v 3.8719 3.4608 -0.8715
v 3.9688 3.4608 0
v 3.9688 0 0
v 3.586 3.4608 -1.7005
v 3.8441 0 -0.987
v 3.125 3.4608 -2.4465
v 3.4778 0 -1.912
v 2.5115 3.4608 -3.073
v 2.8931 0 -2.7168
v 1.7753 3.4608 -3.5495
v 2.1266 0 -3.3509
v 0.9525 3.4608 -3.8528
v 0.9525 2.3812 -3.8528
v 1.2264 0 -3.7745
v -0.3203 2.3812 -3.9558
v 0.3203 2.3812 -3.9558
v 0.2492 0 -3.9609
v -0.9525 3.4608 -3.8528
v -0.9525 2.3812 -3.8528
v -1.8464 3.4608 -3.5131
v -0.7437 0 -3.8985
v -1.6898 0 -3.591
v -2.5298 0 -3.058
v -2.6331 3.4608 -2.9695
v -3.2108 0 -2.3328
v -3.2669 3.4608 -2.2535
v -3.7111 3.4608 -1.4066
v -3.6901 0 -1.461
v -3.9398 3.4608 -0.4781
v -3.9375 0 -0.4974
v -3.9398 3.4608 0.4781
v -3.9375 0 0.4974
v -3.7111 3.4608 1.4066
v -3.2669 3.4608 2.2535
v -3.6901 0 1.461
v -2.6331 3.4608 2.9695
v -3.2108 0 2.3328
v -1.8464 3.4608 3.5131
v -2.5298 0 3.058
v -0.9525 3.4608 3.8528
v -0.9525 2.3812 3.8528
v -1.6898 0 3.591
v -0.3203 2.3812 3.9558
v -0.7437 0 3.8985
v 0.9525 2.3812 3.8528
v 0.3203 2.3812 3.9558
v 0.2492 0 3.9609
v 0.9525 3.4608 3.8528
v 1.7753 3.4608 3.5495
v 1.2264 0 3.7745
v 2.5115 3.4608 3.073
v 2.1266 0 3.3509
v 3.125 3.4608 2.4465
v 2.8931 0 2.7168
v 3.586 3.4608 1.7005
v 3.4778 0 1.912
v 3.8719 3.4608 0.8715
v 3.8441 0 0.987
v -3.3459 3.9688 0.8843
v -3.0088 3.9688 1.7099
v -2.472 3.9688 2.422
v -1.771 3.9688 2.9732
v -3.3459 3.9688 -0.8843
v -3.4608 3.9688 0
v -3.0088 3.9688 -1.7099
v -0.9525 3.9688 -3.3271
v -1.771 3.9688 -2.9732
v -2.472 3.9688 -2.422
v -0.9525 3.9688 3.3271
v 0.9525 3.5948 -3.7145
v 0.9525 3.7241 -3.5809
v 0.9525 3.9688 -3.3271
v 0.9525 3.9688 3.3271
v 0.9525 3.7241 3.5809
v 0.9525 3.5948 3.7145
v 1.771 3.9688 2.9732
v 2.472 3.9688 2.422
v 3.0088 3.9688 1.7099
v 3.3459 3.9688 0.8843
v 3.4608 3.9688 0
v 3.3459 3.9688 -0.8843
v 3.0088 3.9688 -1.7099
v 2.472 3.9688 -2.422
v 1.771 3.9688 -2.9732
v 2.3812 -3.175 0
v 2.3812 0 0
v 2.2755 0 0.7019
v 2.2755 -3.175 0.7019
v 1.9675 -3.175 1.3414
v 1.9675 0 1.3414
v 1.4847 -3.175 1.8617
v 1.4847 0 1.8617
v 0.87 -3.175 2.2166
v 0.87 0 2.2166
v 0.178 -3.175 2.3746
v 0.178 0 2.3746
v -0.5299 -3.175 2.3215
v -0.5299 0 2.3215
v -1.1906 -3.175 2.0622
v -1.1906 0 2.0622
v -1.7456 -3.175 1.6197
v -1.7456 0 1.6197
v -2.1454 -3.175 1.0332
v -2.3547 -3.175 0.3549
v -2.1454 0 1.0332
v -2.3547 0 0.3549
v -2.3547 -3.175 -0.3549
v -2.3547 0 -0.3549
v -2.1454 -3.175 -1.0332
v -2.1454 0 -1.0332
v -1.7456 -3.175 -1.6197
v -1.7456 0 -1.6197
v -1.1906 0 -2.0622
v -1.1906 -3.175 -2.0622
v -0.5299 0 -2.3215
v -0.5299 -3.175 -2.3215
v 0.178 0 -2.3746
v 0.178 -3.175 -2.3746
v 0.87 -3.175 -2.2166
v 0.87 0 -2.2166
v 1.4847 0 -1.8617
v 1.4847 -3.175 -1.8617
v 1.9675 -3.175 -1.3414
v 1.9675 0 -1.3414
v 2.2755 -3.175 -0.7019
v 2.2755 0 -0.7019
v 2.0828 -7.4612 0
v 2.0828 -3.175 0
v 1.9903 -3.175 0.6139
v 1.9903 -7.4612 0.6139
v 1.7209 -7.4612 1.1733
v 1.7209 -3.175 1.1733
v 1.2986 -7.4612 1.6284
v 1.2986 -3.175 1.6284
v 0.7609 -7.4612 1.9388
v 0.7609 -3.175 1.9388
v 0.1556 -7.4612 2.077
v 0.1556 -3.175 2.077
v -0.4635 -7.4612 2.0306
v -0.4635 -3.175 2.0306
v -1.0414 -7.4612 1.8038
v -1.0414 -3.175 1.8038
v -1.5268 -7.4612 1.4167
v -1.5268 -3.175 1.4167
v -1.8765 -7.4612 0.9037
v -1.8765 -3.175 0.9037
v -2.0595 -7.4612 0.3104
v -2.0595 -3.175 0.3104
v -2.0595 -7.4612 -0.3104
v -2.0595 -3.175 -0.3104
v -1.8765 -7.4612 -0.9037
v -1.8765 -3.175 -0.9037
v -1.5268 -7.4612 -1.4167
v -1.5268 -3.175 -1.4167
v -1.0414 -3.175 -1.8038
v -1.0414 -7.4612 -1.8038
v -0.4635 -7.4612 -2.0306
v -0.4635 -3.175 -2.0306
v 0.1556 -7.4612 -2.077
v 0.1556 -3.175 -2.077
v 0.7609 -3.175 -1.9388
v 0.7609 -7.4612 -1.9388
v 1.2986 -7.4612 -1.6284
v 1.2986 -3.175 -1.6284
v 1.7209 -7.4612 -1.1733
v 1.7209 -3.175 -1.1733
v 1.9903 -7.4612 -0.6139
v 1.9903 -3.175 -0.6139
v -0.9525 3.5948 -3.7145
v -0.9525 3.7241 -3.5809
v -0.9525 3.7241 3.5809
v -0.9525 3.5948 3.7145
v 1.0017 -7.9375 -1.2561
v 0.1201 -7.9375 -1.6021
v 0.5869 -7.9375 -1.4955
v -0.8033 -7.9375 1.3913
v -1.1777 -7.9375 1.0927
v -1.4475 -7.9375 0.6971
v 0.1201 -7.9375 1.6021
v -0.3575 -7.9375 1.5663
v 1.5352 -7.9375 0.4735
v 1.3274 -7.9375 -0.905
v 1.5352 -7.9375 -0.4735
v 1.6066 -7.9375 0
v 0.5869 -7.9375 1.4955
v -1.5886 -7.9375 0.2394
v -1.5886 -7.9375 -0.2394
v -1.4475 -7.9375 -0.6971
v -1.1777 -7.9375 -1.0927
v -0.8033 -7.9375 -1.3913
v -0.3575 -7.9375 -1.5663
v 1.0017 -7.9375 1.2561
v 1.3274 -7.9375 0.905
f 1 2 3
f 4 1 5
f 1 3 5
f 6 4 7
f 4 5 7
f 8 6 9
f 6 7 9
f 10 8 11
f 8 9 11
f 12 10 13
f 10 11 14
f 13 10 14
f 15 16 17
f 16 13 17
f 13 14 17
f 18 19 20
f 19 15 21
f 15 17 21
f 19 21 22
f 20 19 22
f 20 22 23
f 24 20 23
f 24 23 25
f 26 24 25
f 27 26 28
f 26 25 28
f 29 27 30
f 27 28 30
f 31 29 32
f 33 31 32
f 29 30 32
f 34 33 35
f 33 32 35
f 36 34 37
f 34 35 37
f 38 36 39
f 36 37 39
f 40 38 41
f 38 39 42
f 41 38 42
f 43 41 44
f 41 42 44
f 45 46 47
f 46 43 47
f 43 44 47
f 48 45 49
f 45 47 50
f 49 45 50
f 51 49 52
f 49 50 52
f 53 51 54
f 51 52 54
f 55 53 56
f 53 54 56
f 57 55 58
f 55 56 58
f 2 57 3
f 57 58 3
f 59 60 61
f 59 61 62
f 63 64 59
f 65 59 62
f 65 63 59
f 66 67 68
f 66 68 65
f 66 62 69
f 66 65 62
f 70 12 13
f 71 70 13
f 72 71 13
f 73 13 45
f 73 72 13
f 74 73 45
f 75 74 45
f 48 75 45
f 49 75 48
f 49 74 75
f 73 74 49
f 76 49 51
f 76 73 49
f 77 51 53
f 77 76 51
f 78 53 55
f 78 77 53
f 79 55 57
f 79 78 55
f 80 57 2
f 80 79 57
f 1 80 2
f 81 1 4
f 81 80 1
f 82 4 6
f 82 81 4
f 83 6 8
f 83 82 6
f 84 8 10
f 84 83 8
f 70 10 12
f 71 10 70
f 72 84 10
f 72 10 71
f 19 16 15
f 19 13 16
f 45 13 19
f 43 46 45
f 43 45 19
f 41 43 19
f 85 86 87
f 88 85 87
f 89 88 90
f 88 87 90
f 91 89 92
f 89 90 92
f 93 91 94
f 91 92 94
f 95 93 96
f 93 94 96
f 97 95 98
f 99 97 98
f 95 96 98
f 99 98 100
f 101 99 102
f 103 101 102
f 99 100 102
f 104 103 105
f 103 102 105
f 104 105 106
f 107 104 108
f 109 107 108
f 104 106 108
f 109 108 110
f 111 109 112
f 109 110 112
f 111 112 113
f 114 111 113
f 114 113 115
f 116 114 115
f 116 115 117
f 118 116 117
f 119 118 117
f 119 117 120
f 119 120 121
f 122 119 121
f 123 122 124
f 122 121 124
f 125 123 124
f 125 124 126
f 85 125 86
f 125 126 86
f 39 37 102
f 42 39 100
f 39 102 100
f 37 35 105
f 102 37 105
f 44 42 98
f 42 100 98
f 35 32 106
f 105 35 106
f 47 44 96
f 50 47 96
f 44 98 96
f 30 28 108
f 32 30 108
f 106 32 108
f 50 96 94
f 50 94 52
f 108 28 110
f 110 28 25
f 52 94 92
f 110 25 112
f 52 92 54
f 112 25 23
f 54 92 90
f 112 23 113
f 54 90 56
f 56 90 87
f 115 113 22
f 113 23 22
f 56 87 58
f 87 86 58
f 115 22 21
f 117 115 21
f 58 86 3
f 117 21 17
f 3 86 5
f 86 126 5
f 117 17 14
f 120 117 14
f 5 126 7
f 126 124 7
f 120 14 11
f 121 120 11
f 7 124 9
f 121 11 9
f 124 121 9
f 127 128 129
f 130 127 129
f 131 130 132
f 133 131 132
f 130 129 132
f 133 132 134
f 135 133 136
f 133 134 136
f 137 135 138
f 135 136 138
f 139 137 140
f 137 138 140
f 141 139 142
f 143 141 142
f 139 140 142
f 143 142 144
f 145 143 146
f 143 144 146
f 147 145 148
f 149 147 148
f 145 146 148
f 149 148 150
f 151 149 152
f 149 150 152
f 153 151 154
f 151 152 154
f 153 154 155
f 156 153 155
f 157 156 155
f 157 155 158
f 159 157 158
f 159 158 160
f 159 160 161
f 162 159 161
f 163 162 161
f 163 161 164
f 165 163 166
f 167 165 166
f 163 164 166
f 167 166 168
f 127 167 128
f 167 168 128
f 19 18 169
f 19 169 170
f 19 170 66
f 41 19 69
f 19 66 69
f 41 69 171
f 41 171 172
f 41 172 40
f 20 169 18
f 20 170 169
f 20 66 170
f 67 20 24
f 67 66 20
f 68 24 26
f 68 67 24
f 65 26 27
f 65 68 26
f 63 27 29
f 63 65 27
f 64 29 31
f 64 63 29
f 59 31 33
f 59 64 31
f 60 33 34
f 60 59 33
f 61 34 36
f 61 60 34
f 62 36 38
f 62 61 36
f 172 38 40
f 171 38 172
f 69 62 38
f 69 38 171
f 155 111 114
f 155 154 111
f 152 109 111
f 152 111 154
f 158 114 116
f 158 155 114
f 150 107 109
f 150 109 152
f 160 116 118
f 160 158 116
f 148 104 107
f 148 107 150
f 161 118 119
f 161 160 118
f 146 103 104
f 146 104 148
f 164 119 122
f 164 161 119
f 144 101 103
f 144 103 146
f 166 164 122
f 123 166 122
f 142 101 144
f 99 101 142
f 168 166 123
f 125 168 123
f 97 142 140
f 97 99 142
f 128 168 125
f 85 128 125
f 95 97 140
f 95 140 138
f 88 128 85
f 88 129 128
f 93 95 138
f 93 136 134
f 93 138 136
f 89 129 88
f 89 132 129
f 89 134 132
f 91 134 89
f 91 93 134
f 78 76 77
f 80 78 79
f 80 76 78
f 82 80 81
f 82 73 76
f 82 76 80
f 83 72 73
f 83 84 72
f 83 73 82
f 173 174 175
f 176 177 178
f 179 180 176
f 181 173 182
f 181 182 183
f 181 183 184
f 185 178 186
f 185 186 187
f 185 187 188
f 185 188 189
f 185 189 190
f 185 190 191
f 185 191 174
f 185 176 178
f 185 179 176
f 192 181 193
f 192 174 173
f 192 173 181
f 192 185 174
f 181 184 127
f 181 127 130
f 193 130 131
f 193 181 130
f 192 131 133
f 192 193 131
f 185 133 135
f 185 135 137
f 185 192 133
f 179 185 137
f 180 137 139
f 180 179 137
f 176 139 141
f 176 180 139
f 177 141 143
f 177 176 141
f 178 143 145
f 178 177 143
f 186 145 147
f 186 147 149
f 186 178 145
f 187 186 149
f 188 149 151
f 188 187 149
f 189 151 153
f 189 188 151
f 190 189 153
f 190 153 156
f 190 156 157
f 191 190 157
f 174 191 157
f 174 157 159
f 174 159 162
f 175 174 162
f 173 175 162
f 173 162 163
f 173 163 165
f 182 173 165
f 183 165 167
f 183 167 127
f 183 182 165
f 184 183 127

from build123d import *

# Parameters (mm, degrees)
SKETCH1_R          = 3.96875
EXTRUDE1_DEPTH     = 3.96875
SKETCH2_W          = 1.905
SKETCH2_H          = 7.9375
CUT_EXTRUDE1_DEPTH = 1.5875
SKETCH4_R          = 2.38125
EXTRUDE2_DEPTH     = 3.175
SKETCH5_R          = 2.0828
EXTRUDE3_DEPTH     = 4.7625
CHAMFER1_SIZE      = 0.508
CHAMFER2_SIZE      = 0.47625


with BuildPart() as part:
    # Sketch1 → Extrude1 (new body)
    with BuildSketch(Plane(origin=(0, 0, 0), x_dir=(1, 0, 0), z_dir=(0, 1, 0))):
        Circle(SKETCH1_R)
    extrude(amount=EXTRUDE1_DEPTH)

    # Sketch2 → Cut-Extrude1 (cut)
    with BuildSketch(Plane(origin=(0, 3.96875, 0), x_dir=(-1, 0, 0), z_dir=(0, 1, 0))):
        Rectangle(SKETCH2_W, SKETCH2_H)
    extrude(amount=-CUT_EXTRUDE1_DEPTH, mode=Mode.SUBTRACT)

    # Sketch4 → Extrude2 (add)
    with BuildSketch(Plane.XZ):
        Circle(SKETCH4_R)
    extrude(amount=EXTRUDE2_DEPTH)

    # Sketch5 → Extrude3 (add)
    with BuildSketch(Plane.XZ.offset(3.175)):
        Circle(SKETCH5_R)
    extrude(amount=EXTRUDE3_DEPTH)

    # Chamfer1
    chamfer1_edges = [part.edges().sort_by_distance(p)[0] for p in [
        (3.124996875, 3.96875, -2.446501807),
        (-3.96875, 3.96875, 0),
    ]]
    chamfer(chamfer1_edges, length=CHAMFER1_SIZE)

    # Chamfer2
    chamfer2_edges = [part.edges().sort_by_distance(p)[0] for p in [
        (-2.0828, -7.9375, 0),
    ]]
    chamfer(chamfer2_edges, length=CHAMFER2_SIZE)


solid = part.part
